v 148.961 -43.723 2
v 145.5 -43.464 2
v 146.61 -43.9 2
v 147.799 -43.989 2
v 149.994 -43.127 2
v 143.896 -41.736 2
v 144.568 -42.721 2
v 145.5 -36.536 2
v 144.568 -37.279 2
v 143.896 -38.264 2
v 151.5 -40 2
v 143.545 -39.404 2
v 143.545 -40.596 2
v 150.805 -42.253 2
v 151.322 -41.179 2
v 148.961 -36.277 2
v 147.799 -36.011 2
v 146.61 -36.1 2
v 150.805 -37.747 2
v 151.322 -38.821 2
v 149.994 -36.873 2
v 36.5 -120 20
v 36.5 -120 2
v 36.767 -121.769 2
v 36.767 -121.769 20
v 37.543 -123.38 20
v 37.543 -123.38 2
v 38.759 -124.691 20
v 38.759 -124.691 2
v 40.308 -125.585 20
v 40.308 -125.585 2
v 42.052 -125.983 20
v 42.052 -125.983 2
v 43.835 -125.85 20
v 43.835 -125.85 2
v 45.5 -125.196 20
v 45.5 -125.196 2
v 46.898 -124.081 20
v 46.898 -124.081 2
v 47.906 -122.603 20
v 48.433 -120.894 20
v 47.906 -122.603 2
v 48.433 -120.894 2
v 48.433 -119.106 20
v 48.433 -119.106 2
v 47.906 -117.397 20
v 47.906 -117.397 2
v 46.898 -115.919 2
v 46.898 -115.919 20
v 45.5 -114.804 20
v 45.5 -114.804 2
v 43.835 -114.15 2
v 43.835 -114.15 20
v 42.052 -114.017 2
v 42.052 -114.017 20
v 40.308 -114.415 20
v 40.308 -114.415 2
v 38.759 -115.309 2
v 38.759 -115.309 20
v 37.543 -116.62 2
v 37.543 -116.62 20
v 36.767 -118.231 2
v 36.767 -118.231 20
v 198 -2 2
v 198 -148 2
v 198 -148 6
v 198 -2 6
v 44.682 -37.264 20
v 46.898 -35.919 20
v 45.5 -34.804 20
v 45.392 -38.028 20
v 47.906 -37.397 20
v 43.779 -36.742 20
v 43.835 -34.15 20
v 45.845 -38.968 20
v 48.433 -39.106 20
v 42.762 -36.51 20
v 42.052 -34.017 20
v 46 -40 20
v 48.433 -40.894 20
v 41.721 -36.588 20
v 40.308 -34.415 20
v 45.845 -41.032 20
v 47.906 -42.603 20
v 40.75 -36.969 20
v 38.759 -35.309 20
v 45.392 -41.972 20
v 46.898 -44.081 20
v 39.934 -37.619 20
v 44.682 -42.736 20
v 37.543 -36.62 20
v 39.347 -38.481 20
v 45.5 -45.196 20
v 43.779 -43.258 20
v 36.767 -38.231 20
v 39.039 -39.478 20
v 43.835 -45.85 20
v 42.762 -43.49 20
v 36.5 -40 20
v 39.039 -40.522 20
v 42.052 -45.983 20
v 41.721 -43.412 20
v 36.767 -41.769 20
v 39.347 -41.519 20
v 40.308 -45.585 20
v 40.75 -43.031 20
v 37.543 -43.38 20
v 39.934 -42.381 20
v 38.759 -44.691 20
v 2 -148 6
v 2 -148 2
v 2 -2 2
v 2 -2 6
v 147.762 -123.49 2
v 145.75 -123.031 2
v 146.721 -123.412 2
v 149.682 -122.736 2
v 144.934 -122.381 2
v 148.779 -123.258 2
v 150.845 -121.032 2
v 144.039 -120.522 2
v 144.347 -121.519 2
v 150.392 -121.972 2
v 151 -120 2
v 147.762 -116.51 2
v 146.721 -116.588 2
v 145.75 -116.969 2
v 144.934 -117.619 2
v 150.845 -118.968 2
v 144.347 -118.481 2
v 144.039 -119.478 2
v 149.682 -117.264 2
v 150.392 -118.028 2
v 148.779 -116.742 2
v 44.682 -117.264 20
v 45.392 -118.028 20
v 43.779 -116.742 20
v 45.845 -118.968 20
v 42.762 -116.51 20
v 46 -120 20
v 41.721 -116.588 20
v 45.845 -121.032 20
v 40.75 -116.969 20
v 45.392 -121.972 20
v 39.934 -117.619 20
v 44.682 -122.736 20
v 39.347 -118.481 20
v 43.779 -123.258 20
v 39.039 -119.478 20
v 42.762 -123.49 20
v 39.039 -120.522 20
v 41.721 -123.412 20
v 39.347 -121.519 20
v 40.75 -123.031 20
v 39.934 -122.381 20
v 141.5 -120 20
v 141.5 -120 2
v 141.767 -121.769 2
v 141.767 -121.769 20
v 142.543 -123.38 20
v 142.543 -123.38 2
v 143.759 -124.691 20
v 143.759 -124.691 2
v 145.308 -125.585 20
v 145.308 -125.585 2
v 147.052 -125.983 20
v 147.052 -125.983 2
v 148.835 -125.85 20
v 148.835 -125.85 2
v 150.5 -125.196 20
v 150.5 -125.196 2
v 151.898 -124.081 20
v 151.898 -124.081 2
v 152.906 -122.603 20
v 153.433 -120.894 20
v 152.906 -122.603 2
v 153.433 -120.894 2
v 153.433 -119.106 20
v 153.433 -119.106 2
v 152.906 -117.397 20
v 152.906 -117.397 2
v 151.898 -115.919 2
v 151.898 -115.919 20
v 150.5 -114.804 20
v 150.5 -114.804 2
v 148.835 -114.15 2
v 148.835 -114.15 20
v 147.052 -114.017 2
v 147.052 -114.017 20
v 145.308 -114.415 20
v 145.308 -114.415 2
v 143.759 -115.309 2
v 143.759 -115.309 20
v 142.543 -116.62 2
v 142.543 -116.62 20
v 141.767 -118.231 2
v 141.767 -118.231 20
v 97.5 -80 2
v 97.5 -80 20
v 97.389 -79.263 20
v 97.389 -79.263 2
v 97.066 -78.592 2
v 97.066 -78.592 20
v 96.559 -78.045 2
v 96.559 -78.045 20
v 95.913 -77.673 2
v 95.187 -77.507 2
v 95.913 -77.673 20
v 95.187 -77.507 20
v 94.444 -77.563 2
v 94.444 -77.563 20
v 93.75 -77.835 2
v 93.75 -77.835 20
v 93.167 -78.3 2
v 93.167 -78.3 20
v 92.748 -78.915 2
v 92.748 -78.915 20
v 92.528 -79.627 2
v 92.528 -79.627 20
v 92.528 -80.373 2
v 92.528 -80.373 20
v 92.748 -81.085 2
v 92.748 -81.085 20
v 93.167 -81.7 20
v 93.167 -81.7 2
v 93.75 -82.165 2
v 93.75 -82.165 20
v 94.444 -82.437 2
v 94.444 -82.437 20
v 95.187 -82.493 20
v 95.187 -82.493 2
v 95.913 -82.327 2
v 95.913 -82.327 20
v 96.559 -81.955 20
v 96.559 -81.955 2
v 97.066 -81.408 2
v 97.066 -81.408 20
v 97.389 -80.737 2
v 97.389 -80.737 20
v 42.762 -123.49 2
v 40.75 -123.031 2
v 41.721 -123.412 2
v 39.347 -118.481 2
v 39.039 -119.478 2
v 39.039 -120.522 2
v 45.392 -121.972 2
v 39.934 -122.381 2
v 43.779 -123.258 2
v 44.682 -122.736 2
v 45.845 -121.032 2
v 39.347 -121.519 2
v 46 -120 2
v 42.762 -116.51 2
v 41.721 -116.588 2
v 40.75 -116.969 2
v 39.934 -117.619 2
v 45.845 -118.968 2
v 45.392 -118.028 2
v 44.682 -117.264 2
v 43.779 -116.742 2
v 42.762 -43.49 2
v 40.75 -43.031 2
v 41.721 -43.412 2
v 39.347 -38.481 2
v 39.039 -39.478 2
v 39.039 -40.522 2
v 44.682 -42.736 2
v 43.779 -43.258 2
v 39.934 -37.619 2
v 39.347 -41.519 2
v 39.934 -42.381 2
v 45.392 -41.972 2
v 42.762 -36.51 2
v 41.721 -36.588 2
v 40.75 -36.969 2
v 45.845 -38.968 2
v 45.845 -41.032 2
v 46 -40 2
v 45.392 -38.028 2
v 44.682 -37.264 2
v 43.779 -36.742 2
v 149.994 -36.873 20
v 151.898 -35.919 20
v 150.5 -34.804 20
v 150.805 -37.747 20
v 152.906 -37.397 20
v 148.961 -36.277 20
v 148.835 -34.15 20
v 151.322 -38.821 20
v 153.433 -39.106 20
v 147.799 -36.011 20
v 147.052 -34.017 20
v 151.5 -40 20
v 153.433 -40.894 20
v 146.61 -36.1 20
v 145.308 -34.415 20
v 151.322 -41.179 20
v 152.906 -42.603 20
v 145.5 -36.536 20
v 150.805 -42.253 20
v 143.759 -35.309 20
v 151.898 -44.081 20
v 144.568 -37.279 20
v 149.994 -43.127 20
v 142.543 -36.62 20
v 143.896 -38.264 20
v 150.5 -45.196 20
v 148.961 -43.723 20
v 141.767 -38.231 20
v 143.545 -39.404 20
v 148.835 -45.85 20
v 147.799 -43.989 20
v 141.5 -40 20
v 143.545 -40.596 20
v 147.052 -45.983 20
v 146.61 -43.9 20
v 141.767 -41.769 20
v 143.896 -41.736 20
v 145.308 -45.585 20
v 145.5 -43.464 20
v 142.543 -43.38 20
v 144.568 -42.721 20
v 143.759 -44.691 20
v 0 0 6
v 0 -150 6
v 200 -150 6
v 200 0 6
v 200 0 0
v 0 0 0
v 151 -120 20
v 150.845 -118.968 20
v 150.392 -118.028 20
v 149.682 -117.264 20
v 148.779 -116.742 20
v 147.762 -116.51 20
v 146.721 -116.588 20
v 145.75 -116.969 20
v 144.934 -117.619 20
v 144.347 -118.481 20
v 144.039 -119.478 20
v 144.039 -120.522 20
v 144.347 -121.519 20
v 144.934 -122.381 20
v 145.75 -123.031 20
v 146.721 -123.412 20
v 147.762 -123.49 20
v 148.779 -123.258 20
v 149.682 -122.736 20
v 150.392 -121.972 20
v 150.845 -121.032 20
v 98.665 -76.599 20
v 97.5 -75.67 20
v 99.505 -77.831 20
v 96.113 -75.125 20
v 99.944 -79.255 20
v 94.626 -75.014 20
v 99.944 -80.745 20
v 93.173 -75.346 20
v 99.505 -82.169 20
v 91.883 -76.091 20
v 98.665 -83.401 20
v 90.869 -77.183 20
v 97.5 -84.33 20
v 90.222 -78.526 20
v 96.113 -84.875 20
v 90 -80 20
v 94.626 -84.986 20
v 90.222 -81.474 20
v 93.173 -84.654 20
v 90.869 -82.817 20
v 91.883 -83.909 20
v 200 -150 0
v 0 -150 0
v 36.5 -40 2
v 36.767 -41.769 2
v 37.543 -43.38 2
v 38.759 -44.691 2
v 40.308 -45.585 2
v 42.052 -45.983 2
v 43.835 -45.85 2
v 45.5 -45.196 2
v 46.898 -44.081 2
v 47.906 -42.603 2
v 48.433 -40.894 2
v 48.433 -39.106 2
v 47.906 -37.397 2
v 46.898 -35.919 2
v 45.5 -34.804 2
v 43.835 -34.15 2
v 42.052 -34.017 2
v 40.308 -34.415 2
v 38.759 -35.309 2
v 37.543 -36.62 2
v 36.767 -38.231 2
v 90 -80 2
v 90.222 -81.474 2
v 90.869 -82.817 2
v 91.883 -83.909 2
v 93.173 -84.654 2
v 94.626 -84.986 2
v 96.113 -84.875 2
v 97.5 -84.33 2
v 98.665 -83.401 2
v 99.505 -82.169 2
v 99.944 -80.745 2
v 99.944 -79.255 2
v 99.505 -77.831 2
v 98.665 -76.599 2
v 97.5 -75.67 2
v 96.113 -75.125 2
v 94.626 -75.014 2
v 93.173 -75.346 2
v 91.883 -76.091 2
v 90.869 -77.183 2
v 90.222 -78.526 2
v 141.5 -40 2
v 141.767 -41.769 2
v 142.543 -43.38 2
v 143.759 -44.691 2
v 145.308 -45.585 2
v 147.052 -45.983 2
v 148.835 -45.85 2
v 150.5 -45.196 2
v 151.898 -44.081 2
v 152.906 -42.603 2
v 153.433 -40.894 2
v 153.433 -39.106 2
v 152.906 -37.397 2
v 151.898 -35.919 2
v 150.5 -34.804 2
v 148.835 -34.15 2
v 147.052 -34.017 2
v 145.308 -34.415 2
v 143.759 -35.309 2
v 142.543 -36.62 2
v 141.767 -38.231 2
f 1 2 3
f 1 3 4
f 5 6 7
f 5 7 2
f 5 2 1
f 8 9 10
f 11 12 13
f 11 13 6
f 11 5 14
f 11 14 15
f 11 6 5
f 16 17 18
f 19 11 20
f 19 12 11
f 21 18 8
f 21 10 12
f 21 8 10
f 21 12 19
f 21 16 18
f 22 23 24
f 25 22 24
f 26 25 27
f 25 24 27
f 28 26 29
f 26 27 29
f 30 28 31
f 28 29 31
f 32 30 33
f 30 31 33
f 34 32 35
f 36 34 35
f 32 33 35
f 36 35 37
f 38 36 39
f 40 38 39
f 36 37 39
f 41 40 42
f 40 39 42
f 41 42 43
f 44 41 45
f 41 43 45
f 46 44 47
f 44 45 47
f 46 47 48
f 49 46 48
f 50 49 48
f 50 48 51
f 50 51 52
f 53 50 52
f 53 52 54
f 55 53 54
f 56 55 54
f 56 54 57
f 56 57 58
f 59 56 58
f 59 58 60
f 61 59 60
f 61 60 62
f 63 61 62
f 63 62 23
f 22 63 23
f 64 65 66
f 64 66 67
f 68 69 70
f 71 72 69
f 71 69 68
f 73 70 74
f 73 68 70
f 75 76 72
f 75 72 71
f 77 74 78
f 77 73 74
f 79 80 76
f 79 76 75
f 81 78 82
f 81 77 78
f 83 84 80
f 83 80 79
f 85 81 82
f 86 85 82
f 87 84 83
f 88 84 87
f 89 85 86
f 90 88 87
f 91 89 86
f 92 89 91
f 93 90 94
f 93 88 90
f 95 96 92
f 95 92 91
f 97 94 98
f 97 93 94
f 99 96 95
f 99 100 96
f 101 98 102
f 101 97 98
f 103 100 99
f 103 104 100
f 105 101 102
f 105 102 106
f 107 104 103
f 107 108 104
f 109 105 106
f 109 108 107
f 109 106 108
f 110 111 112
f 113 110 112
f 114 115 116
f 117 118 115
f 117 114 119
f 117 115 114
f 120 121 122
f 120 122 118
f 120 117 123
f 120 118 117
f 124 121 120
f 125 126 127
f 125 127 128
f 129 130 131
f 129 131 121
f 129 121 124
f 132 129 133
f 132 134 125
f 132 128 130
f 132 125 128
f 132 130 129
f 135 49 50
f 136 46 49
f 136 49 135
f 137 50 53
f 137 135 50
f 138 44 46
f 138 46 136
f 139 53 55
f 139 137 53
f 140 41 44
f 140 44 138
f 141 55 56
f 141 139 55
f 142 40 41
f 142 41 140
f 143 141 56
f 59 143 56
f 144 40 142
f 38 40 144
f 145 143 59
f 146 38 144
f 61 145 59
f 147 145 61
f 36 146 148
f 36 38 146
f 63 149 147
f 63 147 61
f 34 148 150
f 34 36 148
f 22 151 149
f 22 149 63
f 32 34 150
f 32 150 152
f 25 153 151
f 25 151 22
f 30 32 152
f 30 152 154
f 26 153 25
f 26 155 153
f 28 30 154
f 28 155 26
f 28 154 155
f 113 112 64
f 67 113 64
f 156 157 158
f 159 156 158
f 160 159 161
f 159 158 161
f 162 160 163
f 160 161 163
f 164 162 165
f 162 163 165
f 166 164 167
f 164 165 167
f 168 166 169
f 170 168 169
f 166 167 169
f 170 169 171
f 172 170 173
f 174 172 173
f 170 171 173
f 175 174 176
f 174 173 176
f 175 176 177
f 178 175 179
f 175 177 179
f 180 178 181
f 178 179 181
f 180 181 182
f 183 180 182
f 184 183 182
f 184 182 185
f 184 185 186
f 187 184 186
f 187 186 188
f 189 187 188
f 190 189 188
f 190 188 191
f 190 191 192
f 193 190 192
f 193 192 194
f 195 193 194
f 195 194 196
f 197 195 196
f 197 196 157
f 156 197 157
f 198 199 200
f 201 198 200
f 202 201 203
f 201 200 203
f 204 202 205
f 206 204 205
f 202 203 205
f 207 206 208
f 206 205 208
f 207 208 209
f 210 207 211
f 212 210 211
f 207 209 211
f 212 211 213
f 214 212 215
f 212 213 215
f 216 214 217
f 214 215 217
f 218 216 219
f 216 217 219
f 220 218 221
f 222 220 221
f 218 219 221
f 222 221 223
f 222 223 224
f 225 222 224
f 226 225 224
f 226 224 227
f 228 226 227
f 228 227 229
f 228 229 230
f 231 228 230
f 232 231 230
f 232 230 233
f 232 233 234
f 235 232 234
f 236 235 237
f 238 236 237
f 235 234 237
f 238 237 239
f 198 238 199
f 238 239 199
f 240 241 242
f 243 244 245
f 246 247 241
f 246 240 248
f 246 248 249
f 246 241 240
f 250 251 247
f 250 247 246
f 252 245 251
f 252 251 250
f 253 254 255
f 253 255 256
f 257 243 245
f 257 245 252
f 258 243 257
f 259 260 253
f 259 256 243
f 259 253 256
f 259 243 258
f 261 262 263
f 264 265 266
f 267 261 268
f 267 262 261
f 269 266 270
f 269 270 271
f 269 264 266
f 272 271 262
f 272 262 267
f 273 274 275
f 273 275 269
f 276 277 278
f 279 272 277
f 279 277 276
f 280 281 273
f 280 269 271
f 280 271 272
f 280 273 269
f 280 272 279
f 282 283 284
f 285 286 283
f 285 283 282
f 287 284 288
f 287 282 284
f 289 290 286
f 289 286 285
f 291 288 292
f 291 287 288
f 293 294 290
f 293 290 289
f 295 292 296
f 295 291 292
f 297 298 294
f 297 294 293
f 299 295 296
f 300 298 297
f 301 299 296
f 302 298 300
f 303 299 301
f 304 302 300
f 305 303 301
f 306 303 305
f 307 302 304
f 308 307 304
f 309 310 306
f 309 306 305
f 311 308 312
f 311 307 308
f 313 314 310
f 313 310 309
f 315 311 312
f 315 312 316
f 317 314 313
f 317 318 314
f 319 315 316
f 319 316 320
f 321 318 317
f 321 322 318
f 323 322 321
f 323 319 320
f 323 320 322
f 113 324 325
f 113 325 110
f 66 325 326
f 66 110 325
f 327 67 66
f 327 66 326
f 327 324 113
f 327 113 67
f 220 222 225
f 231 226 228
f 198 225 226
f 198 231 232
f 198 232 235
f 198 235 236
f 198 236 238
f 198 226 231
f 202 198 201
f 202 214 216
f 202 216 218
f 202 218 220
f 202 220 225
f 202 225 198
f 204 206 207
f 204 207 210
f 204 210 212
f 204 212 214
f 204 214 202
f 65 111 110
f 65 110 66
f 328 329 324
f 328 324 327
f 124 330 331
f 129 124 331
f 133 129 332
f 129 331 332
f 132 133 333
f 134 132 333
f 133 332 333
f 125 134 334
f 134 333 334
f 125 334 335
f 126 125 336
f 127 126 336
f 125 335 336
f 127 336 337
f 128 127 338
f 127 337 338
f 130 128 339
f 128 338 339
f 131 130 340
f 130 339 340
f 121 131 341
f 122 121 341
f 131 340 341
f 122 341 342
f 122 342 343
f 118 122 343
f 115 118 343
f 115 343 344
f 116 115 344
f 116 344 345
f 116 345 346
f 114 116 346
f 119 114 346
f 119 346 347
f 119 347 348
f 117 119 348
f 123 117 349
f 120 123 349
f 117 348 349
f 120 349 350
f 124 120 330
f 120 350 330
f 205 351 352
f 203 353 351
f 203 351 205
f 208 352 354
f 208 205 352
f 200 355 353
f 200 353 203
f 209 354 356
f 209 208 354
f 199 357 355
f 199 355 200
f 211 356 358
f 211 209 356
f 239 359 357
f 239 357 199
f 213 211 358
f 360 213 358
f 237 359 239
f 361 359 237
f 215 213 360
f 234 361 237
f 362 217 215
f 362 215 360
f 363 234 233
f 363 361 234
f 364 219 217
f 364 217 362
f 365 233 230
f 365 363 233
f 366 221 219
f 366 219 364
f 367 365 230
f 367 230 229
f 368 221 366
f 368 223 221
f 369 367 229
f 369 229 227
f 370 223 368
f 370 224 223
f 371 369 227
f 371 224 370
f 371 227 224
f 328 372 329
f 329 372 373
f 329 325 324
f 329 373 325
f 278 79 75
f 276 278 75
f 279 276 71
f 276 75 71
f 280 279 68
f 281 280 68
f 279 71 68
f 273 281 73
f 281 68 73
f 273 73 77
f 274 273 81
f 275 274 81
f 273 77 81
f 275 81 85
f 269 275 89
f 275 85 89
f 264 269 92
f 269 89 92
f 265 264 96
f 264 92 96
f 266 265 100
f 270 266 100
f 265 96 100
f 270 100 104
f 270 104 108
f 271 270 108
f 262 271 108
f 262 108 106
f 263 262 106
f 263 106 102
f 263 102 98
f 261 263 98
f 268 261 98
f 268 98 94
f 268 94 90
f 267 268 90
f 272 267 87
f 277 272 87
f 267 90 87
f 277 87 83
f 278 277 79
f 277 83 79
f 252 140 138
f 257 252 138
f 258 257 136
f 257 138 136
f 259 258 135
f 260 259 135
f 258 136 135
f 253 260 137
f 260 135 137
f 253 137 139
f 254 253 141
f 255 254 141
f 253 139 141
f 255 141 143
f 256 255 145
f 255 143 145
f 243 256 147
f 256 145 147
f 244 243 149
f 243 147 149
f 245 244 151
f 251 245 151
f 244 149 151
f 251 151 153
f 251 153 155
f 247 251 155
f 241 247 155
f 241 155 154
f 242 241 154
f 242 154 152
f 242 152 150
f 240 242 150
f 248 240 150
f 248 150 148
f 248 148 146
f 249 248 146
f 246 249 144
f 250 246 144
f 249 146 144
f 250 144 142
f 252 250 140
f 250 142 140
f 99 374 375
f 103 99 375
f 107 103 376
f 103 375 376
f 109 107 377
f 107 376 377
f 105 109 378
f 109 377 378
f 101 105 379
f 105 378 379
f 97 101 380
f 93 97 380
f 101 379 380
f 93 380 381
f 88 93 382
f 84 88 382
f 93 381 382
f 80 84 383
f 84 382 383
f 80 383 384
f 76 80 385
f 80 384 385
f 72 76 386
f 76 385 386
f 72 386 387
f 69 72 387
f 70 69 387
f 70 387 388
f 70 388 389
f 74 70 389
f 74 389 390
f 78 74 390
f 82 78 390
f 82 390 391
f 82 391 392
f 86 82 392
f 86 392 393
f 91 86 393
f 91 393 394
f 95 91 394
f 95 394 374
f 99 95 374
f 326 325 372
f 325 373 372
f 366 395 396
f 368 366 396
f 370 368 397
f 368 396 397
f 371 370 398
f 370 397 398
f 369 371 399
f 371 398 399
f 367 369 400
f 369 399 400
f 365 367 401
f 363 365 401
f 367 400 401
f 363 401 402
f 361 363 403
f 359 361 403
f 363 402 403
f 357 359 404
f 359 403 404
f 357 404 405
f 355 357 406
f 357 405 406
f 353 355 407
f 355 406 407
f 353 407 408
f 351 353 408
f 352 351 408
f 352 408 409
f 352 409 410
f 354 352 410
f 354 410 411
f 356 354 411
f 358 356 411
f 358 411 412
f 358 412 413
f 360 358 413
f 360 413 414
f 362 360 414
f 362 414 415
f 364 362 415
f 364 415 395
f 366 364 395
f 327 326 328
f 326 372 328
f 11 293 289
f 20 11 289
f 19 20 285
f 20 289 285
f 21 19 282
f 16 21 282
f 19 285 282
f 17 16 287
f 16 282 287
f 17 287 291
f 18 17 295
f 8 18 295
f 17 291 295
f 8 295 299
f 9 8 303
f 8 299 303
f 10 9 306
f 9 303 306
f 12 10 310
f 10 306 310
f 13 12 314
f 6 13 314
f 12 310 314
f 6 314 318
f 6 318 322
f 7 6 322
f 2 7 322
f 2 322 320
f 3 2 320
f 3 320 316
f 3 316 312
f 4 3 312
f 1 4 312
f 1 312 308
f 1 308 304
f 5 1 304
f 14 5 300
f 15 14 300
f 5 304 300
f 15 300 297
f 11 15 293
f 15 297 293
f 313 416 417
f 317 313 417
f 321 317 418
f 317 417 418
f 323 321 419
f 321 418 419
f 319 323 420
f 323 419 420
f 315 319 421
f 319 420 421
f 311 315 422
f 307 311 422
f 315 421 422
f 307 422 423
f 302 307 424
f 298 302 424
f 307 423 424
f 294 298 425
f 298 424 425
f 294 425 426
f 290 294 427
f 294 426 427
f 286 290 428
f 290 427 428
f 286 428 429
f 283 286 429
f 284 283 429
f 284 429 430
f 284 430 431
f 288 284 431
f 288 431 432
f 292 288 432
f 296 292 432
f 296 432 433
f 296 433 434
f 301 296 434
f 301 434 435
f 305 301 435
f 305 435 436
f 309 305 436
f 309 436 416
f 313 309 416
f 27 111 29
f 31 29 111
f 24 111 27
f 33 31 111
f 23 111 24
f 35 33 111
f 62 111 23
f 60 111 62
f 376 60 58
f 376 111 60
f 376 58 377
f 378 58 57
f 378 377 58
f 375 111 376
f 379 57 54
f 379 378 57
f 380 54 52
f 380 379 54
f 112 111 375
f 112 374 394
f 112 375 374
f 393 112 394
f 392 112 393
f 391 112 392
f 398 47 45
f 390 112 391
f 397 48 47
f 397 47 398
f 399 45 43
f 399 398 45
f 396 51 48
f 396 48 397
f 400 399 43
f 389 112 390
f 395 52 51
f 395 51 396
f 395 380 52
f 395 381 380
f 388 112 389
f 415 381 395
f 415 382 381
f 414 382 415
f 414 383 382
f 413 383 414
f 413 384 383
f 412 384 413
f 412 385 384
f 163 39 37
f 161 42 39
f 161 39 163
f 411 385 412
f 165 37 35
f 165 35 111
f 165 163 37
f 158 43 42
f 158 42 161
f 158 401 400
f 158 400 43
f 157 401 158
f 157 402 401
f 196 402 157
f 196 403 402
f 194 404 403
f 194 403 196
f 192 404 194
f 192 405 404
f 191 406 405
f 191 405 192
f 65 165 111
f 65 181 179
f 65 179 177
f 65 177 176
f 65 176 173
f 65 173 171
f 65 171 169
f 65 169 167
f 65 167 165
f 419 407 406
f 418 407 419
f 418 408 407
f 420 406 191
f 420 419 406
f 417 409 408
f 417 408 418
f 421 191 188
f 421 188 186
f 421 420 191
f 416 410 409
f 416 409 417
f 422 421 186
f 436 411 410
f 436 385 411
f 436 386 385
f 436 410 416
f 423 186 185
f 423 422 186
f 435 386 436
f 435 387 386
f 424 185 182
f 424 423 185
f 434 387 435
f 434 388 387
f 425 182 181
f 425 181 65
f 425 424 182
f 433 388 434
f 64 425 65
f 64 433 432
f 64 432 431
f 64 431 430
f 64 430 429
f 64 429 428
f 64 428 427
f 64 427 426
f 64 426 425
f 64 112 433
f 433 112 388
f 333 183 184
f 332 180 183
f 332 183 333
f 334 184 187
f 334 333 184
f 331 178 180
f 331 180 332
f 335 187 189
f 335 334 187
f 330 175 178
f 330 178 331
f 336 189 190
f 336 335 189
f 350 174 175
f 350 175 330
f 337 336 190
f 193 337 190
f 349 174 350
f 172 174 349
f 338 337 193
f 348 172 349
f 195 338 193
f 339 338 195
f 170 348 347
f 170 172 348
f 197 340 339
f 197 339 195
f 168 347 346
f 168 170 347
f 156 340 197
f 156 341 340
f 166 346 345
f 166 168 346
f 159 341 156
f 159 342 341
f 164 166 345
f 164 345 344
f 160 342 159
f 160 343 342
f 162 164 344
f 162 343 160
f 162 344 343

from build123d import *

# Parameters (mm, degrees)
ESQUISSE1_W             = 200
ESQUISSE1_H             = 150
BOSS_EXTRU_1_DEPTH      = 2
ESQUISSE2_R             = 6
ESQUISSE2_R_2           = 5
BOSS_EXTRU_3_DEPTH      = 20
ESQUISSE3_W             = 200
ESQUISSE3_H             = 150
ESQUISSE3_W_2           = 196
ESQUISSE3_H_2           = 146
BOSS_EXTRU_4_DEPTH      = 4
ESQUISSE4_R             = 4
ENL_V_MAT_EXTRU_1_DEPTH = 18
ENL_V_START             = 18
ESQUISSE5_R             = 3.5
ENL_V_MAT_EXTRU_4_DEPTH = 18
ESQUISSE6_R             = 3.5
ENL_V_MAT_EXTRU_6_DEPTH = 18
ESQUISSE7_R             = 3.5
ENL_V_MAT_EXTRU_7_DEPTH = 18
ESQUISSE8_R             = 2.5
ENL_V_MAT_EXTRU_8_DEPTH = 18


with BuildPart() as part:
    # Esquisse1 → Boss.-Extru.1 (new body)
    with BuildSketch(Plane.XY):
        with Locations((100, -75)):
            Rectangle(ESQUISSE1_W, ESQUISSE1_H)
    extrude(amount=BOSS_EXTRU_1_DEPTH)

    # Esquisse2 → Boss.-Extru.3 (add)
    with BuildSketch(Plane.XY):
        with Locations(Location((42.5, -120, 0), (0, 0, 180))):
            Circle(ESQUISSE2_R)
        with Locations(Location((42.5, -40, 0), (0, 0, 180))):
            Circle(ESQUISSE2_R)
        with Locations(Location((147.5, -120, 0), (0, 0, 180))):
            Circle(ESQUISSE2_R)
        with Locations(Location((147.5, -40, 0), (0, 0, 180))):
            Circle(ESQUISSE2_R)
        with Locations(Location((95, -80, 0), (0, 0, 180))):
            Circle(ESQUISSE2_R_2)
    extrude(amount=BOSS_EXTRU_3_DEPTH)

    # Esquisse3 → Boss.-Extru.4 (add)
    with BuildSketch(Plane.XY.offset(2)):
        with Locations((100, -75)):
            Rectangle(ESQUISSE3_W, ESQUISSE3_H)
        with Locations((100, -75)):
            Rectangle(ESQUISSE3_W_2, ESQUISSE3_H_2, mode=Mode.SUBTRACT)
    extrude(amount=BOSS_EXTRU_4_DEPTH)

    # Esquisse4 → Enlèv. mat.-Extru.1 (cut)
    with BuildSketch(Plane.XY.offset(20)):
        with Locations((147.5, -40)):
            Circle(ESQUISSE4_R)
    extrude(amount=-ENL_V_MAT_EXTRU_1_DEPTH, mode=Mode.SUBTRACT)

    # Esquisse5 → Enlèv. mat.-Extru.4 (cut)
    with BuildSketch(Plane.XY.offset(2).offset(ENL_V_START)):
        with Locations((42.5, -40)):
            Circle(ESQUISSE5_R)
    extrude(amount=-ENL_V_MAT_EXTRU_4_DEPTH, mode=Mode.SUBTRACT)

    # Esquisse6 → Enlèv. mat.-Extru.6 (cut)
    with BuildSketch(Plane.XY.offset(2).offset(ENL_V_START)):
        with Locations((147.5, -120)):
            Circle(ESQUISSE6_R)
    extrude(amount=-ENL_V_MAT_EXTRU_6_DEPTH, mode=Mode.SUBTRACT)

    # Esquisse7 → Enlèv. mat.-Extru.7 (cut)
    with BuildSketch(Plane.XY.offset(2).offset(ENL_V_START)):
        with Locations((42.5, -120)):
            Circle(ESQUISSE7_R)
    extrude(amount=-ENL_V_MAT_EXTRU_7_DEPTH, mode=Mode.SUBTRACT)

    # Esquisse8 → Enlèv. mat.-Extru.8 (cut)
    with BuildSketch(Plane.XY.offset(2).offset(ENL_V_START)):
        with Locations((95, -80)):
            Circle(ESQUISSE8_R)
    extrude(amount=-ENL_V_MAT_EXTRU_8_DEPTH, mode=Mode.SUBTRACT)


solid = part.part
